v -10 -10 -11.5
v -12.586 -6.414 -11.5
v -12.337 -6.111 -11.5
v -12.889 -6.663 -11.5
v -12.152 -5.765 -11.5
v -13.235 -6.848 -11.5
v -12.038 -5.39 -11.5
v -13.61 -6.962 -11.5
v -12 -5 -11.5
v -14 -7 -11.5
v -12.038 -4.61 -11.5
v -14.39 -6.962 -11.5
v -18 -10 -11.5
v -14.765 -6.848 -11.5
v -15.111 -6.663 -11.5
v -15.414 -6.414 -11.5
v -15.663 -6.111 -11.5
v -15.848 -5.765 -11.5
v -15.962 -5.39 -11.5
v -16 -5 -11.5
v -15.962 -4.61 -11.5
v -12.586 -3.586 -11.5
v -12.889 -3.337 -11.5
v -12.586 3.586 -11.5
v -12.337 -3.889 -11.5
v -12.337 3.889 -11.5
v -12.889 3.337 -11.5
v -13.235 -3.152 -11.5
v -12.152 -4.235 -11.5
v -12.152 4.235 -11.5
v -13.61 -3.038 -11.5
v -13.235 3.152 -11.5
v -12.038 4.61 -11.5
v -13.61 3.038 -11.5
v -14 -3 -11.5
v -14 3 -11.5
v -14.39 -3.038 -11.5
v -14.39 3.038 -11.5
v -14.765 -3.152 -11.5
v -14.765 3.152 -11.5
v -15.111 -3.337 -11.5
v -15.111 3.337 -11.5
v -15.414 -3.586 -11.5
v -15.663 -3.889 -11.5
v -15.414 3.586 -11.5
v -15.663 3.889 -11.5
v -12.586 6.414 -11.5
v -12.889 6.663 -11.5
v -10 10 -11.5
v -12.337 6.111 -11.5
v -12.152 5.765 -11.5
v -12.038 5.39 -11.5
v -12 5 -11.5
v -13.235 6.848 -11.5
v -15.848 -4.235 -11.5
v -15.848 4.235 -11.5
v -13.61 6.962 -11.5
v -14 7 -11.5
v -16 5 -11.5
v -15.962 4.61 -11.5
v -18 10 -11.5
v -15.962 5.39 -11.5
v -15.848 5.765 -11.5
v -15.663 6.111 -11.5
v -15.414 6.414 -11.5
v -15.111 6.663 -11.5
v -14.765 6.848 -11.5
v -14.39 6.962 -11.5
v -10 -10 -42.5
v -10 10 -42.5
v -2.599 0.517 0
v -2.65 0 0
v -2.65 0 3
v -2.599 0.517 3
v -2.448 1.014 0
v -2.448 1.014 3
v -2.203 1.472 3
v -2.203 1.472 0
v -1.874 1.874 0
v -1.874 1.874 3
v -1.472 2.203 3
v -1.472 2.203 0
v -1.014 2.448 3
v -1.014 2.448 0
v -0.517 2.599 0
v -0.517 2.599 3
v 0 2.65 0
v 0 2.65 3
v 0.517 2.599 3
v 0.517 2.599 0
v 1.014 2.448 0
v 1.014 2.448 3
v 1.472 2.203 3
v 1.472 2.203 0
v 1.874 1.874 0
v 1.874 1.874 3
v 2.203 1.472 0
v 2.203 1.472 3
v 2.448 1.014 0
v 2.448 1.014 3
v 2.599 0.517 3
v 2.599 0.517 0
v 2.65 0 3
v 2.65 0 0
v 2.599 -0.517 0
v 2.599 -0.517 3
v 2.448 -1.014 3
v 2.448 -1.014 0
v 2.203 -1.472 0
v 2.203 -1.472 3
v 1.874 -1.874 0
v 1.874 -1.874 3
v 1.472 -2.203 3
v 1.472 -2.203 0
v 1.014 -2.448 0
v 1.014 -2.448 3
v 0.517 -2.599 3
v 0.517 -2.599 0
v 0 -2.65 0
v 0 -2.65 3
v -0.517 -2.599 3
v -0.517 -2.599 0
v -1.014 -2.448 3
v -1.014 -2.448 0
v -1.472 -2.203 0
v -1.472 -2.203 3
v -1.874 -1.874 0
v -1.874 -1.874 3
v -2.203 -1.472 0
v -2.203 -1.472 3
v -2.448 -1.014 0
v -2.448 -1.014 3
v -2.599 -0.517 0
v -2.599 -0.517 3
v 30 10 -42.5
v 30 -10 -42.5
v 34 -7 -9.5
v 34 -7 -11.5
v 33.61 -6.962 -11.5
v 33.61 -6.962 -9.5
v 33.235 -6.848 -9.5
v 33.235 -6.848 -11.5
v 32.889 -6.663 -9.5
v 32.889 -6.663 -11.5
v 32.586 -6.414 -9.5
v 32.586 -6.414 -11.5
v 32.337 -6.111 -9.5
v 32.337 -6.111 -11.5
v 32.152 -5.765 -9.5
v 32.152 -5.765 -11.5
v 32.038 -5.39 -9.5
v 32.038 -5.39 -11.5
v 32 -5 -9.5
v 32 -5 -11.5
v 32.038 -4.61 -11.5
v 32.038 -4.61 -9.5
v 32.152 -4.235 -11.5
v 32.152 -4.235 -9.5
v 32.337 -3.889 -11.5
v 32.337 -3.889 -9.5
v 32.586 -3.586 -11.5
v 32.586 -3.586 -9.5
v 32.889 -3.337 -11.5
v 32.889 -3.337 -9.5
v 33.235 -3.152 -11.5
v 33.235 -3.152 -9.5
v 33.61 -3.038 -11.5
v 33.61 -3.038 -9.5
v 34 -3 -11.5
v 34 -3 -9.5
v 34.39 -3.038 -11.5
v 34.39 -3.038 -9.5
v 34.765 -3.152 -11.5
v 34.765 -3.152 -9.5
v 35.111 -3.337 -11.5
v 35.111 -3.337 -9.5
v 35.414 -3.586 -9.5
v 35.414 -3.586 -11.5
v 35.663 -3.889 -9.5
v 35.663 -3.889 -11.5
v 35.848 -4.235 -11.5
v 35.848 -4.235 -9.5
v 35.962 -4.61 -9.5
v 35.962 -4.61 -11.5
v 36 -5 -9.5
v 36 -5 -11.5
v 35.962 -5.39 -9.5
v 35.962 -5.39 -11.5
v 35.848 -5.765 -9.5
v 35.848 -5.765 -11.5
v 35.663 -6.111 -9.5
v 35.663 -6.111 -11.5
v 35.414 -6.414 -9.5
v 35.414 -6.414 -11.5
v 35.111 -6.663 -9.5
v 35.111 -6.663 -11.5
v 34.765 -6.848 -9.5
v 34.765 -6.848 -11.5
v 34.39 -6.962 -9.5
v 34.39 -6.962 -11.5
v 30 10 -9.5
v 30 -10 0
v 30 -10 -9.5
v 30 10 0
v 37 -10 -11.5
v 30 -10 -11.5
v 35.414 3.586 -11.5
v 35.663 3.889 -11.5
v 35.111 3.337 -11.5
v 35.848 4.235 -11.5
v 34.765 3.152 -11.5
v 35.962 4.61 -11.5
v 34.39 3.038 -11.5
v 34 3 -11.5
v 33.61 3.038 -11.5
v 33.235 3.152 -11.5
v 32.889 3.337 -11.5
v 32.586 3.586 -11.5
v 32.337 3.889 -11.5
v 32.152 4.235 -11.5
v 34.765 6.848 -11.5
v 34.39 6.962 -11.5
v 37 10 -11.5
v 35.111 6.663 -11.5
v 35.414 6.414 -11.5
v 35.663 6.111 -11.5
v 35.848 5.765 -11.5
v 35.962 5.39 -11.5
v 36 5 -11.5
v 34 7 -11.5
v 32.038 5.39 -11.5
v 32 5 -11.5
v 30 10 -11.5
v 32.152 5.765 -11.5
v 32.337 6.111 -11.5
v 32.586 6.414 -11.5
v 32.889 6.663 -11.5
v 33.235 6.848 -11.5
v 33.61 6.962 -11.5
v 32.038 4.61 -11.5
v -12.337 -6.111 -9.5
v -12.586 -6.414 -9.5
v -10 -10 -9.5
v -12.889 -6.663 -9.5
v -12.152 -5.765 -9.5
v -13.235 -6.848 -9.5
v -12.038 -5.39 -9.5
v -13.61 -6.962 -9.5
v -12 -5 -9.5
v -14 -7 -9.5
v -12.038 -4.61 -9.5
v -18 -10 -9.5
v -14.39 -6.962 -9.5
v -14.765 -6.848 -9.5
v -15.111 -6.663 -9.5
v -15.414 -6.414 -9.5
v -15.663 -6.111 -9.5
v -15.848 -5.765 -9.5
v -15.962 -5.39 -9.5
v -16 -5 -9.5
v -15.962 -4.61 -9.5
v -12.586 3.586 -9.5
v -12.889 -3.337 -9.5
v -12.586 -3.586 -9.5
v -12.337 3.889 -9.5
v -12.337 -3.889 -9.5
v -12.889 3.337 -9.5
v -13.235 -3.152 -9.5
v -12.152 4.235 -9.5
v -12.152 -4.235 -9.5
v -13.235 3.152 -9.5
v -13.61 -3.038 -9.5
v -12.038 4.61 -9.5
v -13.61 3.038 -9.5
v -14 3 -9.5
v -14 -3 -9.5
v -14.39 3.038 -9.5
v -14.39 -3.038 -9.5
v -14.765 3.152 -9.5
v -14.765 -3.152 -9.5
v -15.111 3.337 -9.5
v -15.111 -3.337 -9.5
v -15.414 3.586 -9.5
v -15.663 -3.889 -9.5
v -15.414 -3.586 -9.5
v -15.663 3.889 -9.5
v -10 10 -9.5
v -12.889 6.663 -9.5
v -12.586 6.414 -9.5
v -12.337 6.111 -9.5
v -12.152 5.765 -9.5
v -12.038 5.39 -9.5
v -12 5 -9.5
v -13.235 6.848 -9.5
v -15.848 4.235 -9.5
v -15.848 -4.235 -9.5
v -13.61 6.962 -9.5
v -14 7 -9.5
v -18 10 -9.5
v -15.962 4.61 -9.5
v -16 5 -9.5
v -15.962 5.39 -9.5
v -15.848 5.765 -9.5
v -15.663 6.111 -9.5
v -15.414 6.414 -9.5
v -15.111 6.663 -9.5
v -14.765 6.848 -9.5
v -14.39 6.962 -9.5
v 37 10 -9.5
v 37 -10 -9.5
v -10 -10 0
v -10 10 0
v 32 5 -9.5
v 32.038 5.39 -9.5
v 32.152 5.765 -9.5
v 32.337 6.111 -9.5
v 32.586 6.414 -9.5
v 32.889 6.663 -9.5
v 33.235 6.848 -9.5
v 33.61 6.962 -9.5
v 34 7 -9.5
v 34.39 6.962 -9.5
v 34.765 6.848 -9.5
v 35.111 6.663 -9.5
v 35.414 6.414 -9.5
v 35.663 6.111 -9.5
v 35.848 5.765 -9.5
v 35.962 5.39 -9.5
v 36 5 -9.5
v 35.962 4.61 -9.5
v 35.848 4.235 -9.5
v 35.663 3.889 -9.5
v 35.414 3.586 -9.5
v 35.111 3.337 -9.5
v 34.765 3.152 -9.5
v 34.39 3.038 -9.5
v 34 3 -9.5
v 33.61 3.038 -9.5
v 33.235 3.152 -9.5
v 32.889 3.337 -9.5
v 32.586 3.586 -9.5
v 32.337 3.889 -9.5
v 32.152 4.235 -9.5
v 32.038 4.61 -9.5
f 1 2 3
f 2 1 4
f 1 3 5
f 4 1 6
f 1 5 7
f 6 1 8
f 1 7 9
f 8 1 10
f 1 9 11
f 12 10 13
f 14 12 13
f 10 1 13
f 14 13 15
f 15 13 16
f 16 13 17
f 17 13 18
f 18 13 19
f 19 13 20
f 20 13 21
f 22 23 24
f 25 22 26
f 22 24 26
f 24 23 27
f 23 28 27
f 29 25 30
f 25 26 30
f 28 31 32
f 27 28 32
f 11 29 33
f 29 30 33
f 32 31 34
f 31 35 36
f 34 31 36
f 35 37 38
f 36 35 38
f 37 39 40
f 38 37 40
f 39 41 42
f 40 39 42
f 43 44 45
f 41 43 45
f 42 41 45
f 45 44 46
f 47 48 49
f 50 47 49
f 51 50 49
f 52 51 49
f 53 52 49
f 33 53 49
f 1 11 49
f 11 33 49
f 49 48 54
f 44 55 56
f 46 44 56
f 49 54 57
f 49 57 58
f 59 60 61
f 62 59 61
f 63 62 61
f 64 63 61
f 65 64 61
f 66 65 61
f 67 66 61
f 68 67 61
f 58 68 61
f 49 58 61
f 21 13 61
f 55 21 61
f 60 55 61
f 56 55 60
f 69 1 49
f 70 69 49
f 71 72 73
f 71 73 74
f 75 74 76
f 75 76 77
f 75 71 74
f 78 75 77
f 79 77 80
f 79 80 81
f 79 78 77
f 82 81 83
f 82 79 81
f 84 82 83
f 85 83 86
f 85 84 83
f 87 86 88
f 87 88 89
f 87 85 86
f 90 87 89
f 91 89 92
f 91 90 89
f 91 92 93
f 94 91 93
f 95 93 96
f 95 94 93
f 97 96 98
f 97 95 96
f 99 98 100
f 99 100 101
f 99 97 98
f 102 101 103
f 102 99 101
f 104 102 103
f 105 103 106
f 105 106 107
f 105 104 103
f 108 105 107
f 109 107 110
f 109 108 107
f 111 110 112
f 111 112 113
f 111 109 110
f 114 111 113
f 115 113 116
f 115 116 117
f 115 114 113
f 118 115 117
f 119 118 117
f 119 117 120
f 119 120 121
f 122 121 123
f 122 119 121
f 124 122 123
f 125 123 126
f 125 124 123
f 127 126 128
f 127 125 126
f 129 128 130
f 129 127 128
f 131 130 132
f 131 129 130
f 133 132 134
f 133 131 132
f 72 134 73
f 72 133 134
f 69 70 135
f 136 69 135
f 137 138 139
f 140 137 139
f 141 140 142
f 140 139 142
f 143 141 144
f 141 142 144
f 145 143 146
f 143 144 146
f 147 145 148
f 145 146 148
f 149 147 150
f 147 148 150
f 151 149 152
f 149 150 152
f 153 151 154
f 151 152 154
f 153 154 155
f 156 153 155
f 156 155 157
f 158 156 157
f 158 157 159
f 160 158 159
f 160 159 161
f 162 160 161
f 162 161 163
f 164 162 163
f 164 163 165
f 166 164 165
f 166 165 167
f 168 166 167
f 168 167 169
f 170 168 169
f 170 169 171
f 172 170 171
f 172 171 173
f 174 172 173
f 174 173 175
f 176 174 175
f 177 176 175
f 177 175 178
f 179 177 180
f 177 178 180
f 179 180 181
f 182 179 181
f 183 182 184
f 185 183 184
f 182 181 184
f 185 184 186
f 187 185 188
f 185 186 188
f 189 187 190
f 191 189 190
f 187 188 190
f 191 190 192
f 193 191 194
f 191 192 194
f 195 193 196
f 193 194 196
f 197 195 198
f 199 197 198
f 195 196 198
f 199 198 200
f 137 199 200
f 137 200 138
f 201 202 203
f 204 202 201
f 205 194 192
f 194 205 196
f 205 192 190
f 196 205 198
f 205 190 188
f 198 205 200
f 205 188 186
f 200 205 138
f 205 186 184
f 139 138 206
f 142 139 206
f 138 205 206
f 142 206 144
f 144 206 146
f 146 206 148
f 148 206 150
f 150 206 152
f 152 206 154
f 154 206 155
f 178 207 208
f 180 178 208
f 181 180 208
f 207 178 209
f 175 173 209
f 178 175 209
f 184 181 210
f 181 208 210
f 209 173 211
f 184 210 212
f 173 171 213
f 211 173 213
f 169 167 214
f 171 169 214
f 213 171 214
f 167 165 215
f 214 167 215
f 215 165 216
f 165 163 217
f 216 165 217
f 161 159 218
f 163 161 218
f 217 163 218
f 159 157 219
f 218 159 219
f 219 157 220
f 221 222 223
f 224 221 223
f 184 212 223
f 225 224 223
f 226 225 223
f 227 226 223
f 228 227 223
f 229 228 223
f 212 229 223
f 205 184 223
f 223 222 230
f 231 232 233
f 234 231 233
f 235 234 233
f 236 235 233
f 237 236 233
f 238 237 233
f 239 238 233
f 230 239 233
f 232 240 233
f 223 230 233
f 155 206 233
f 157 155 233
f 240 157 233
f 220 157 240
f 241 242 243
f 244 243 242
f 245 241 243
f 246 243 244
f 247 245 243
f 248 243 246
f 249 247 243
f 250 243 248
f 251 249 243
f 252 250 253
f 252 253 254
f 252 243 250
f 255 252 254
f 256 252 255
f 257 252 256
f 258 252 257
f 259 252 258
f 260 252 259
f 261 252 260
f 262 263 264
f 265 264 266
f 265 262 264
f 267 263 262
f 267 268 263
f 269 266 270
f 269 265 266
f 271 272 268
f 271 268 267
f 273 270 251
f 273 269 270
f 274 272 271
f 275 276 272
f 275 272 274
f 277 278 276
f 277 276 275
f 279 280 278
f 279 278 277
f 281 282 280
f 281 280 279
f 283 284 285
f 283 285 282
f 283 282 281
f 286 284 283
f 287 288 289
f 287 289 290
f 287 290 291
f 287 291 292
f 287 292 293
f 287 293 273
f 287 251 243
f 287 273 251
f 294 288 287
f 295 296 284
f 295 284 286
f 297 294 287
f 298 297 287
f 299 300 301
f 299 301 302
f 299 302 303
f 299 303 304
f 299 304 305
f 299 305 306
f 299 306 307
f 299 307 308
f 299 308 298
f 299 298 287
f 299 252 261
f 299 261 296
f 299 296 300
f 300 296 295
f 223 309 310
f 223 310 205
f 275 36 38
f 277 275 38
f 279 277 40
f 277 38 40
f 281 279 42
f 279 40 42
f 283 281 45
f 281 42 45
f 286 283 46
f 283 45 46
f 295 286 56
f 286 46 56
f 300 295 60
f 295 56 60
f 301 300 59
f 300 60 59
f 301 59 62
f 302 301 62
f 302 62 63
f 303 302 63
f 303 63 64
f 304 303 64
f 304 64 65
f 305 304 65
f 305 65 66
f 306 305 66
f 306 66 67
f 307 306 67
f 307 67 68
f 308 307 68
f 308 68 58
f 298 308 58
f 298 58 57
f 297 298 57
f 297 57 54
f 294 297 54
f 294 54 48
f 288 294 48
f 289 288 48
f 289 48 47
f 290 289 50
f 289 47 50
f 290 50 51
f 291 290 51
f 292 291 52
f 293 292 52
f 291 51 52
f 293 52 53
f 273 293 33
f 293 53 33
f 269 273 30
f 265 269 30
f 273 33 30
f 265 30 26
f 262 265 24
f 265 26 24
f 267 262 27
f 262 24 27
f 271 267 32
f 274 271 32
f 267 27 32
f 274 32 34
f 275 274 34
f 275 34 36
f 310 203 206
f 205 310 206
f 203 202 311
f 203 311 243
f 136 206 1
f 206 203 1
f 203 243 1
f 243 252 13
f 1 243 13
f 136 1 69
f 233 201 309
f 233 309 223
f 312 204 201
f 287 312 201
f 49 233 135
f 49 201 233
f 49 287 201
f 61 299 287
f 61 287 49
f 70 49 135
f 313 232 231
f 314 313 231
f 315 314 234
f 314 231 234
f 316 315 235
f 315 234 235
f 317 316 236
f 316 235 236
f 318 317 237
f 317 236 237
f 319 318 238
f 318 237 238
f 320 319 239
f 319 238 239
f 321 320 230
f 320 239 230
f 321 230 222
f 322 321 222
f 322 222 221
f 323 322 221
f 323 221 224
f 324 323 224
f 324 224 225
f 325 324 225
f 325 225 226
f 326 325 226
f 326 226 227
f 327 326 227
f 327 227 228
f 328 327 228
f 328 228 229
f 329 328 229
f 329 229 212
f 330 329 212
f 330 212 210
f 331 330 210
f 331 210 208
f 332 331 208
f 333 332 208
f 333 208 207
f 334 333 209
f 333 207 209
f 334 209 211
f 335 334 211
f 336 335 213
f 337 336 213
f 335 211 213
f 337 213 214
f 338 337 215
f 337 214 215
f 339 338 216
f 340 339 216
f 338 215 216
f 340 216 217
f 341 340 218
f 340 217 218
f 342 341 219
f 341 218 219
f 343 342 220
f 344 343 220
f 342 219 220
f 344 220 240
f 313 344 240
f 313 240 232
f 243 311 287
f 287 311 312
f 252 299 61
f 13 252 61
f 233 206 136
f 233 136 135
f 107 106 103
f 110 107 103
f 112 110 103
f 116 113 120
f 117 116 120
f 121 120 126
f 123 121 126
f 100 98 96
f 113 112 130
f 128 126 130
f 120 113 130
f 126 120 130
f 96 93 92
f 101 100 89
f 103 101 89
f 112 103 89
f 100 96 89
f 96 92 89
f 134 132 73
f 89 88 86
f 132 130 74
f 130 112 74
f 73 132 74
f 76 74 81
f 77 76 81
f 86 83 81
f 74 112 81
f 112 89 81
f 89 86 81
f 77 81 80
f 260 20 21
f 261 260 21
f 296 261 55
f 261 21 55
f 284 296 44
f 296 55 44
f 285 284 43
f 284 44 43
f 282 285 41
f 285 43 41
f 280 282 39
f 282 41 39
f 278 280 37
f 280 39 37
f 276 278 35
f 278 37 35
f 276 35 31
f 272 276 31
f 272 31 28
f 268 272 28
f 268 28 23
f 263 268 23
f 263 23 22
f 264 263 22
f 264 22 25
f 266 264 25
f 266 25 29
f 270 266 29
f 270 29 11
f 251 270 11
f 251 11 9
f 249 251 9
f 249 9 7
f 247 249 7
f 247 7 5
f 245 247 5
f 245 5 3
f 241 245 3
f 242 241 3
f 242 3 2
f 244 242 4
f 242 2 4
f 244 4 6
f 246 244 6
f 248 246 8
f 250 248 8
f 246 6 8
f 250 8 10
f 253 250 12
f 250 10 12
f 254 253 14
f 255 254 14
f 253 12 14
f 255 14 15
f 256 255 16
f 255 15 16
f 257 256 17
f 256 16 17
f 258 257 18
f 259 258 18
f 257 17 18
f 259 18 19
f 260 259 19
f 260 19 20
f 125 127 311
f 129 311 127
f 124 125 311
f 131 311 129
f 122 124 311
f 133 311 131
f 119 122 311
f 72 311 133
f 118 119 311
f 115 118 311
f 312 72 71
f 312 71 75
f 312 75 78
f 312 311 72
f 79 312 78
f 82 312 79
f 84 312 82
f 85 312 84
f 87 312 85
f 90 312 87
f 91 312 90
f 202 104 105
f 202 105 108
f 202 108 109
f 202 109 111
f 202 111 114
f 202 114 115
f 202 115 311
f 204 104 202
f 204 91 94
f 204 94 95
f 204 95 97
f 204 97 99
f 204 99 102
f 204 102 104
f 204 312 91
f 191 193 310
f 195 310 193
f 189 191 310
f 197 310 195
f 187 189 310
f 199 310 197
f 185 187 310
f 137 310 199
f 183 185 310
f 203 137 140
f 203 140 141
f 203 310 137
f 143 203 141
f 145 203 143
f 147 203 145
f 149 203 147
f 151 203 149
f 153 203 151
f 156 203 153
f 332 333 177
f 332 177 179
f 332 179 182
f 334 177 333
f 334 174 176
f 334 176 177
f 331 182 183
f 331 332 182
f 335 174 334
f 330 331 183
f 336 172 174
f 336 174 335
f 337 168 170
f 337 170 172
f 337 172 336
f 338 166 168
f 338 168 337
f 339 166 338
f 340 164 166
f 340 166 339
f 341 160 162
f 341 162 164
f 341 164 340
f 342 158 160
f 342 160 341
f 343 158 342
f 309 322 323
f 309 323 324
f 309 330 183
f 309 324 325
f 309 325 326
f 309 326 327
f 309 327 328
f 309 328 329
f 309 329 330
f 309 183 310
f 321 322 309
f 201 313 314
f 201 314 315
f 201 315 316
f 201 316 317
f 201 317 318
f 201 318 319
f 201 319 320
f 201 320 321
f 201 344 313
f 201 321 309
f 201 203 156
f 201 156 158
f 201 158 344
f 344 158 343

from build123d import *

# Parameters (mm, degrees)
ESQUISSE1_W             = 40
ESQUISSE1_H             = 20
BOSS_EXTRU_1_DEPTH      = 42.5
BOSS_EXTRU_2_DEPTH      = 7
BOSS_EXTRU_2_DEPTH_BACK = 48
ESQUISSE2_W             = 2
ESQUISSE2_H             = 20
ESQUISSE3_R             = 2
ENL_V_MAT_EXTRU_1_DEPTH = 7.5
ESQUISSE5_R             = 2.65
BOSS_EXTRU_3_DEPTH      = 3


with BuildPart() as part:
    # Esquisse1 → Boss.-Extru.1 (new body)
    with BuildSketch(Plane.XY):
        with Locations((10, 0)):
            Rectangle(ESQUISSE1_W, ESQUISSE1_H)
    extrude(amount=-BOSS_EXTRU_1_DEPTH)

    # Esquisse2 → Boss.-Extru.2 (add, two sides: drawn at the far end of the back side and taken through both)
    with BuildSketch(Plane(origin=(30, 0, 0), x_dir=(0, 0, -1), z_dir=(1, 0, 0)).offset(-BOSS_EXTRU_2_DEPTH_BACK)):
        with Locations((10.5, 0)):
            Rectangle(ESQUISSE2_W, ESQUISSE2_H)
    extrude(amount=BOSS_EXTRU_2_DEPTH + BOSS_EXTRU_2_DEPTH_BACK)

    # Esquisse3 → Enlèv. mat.-Extru.1 (cut)
    with BuildSketch(Plane(origin=(0, 0, -11.5), x_dir=(-1, 0, 0), z_dir=(0, 0, -1))):
        with Locations(Location((14, 5, 0), (0, 0, 270))):
            Circle(ESQUISSE3_R)
        with Locations((14, -5)):
            Circle(ESQUISSE3_R)
        with Locations(Location((-34, -5, 0), (0, 0, 270))):
            Circle(ESQUISSE3_R)
        with Locations((-34, 5)):
            Circle(ESQUISSE3_R)
    extrude(amount=-ENL_V_MAT_EXTRU_1_DEPTH, mode=Mode.SUBTRACT)

    # Esquisse5 → Boss.-Extru.3 (add)
    with BuildSketch(Plane(origin=(0, 0, 0), x_dir=(-1, 0, 0), z_dir=(0, 0, -1))):
        Circle(ESQUISSE5_R)
    extrude(amount=-BOSS_EXTRU_3_DEPTH)


solid = part.part
